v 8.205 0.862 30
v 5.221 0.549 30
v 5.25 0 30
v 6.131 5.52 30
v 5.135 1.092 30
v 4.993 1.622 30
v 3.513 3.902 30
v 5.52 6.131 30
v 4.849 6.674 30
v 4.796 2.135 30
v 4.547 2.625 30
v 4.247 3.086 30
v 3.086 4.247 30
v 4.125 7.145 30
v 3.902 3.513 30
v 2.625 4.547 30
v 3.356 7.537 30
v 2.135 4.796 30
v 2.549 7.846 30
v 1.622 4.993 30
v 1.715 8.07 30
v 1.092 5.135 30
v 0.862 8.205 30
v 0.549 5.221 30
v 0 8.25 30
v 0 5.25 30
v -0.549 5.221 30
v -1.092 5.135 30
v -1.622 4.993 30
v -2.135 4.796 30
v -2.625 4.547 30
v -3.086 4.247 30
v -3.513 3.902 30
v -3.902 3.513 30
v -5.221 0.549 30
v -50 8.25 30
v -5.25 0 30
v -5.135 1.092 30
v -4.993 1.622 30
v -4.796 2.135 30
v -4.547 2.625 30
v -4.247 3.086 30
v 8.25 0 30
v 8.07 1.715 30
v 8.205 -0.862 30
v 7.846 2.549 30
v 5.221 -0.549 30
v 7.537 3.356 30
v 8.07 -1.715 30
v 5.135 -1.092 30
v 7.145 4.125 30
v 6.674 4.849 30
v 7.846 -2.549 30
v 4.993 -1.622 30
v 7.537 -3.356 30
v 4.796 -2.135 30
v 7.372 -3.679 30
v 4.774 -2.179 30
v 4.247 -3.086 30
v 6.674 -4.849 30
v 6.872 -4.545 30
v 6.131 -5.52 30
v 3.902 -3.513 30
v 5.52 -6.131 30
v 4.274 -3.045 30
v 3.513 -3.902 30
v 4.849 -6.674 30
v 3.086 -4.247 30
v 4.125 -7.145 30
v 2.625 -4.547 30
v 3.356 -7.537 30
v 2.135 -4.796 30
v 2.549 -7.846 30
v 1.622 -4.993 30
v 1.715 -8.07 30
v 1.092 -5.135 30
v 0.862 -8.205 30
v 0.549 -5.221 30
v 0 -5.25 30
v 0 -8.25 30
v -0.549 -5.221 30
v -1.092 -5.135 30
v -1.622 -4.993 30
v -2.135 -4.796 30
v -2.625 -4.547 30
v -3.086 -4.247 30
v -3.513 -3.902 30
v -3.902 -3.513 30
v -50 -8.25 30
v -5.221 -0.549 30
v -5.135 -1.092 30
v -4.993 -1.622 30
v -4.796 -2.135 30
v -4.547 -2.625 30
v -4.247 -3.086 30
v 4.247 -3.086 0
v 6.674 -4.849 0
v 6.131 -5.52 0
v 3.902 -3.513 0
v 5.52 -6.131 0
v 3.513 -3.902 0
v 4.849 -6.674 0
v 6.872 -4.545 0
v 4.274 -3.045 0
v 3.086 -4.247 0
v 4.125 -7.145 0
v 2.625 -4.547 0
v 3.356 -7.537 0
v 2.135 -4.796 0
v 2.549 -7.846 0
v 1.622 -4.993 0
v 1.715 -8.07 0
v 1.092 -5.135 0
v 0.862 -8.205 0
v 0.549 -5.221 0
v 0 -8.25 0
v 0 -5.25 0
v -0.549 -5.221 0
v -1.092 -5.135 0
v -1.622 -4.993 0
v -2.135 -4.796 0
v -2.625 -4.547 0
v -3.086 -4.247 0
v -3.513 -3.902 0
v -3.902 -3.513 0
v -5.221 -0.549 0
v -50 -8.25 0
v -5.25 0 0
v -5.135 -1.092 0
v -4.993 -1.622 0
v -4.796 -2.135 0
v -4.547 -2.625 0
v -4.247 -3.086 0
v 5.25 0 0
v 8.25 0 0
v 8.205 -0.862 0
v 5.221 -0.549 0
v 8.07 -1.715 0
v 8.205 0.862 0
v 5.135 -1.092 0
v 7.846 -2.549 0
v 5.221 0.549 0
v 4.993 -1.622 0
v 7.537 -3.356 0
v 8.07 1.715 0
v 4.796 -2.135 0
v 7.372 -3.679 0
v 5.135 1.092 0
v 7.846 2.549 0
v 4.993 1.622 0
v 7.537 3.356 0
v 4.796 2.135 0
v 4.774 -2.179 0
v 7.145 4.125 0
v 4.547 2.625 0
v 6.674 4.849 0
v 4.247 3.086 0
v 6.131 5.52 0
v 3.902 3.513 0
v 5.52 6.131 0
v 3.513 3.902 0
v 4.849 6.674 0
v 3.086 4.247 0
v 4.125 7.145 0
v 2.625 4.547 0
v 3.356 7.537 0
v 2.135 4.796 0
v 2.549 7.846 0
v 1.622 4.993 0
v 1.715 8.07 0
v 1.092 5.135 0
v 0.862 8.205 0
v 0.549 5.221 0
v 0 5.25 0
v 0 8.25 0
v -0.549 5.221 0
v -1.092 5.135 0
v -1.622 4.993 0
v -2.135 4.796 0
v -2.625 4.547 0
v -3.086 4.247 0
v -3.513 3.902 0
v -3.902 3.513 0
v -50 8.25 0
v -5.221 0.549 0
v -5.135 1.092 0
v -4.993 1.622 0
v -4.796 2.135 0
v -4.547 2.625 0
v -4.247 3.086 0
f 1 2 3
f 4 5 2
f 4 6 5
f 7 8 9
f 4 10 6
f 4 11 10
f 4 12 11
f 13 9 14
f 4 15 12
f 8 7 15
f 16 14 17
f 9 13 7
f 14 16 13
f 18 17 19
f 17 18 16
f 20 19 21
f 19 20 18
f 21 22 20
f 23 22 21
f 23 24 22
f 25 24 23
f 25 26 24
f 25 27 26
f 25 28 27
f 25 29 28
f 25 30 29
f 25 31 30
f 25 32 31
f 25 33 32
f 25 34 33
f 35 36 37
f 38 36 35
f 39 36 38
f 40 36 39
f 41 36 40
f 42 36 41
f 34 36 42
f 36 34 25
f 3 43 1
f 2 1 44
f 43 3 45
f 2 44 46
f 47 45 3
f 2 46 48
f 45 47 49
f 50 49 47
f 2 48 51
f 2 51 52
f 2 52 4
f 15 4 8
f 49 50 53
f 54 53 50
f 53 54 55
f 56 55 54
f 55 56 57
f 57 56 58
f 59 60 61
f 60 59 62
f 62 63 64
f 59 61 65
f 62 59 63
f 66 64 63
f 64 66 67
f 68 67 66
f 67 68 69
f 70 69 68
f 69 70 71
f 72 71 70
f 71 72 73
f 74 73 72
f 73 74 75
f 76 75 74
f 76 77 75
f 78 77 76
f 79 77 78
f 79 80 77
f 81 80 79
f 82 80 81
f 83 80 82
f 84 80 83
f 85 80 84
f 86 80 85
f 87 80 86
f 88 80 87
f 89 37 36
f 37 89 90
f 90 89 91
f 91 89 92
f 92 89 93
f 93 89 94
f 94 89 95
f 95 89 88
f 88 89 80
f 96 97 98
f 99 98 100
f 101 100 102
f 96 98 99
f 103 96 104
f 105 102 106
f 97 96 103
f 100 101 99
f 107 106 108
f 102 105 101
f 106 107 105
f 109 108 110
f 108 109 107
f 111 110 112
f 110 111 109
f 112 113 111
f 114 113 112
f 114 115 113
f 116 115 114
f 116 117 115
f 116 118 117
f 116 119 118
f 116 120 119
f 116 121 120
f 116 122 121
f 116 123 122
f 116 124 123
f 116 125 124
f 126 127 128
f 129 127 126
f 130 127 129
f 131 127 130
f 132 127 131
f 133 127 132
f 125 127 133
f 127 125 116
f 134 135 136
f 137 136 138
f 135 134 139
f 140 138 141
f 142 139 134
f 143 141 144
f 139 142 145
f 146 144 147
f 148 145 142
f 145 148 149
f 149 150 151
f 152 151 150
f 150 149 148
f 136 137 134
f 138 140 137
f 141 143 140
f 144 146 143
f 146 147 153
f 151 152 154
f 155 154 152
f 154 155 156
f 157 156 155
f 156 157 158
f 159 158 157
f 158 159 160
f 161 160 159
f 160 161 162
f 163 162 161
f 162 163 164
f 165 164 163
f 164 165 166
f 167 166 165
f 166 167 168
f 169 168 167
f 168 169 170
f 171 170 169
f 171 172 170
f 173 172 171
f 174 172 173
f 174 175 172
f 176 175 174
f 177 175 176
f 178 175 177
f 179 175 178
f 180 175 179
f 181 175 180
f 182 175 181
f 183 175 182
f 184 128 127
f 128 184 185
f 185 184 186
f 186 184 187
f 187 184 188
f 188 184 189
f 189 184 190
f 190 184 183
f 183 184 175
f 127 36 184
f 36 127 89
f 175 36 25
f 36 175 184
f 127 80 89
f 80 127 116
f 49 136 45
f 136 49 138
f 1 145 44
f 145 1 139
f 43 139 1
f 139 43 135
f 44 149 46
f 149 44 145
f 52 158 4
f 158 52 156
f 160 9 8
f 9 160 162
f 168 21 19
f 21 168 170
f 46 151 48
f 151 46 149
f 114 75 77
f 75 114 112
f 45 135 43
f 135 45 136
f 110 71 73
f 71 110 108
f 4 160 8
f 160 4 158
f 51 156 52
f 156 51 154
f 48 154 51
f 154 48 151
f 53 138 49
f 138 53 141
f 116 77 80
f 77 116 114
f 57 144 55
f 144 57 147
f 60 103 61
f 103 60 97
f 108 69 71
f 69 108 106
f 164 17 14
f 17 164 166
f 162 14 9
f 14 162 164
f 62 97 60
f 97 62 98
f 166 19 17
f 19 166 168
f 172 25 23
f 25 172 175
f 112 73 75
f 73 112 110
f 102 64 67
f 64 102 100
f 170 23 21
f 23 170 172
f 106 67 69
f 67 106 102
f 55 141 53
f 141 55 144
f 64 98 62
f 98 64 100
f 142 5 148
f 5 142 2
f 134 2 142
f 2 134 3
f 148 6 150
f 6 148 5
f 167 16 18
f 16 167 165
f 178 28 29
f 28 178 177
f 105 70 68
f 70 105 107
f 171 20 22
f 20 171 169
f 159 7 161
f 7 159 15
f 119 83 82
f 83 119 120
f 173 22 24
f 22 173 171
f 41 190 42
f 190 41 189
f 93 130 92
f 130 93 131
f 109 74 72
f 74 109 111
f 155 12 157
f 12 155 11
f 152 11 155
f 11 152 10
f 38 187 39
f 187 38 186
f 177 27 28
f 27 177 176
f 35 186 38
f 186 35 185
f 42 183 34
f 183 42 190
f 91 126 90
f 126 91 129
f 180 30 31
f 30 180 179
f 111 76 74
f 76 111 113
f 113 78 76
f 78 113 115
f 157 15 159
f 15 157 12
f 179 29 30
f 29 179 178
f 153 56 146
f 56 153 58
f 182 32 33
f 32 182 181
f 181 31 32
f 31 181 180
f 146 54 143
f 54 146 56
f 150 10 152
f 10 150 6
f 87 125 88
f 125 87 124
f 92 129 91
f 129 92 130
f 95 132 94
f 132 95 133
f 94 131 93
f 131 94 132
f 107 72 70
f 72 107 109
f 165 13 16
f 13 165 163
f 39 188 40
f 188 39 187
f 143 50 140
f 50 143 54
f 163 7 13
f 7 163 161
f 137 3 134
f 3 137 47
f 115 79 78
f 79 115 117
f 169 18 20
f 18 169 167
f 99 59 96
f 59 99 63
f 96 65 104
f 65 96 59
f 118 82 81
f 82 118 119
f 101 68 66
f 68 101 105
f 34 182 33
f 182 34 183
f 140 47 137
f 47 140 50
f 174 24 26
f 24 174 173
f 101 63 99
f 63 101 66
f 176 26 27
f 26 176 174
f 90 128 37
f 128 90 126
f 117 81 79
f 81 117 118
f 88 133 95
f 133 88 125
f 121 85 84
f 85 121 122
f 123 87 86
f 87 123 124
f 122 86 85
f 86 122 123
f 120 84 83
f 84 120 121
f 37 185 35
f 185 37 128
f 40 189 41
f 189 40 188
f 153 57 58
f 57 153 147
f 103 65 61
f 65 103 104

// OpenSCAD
// file: funciones.scad
// Nueva impresora by Chema <josema@pentabyte.es>
// Funciones que se usan en otros archivos
// GNU GPL v3
// Mod from
// Josef Průša <josefprusa@me.com>
// Václav 'ax' Hůla <axtheb@gmail.com>
// Vlnofka <>
// http://www.reprap.org/wiki/Prusa_Mendel
// http://github.com/prusajr/PrusaMendel

module screw(h=20, r=2, r_head=3.5, head_drop=0, slant=true, poly=false, $fn=0){
    //makes screw with head
    //for substraction as screw hole
    if (poly) {
        cylinder_poly(h=h, r=r, $fn=$fn);
    } else {
        cylinder(h=h, r=r, $fn=$fn);
    }
    if (slant) {
        translate([0, 0, head_drop-0.01]) cylinder(h=r_head, r2=0, r1=r_head, $fn=$fn);
    }

    if (head_drop > 0) {
        translate([0, 0, -0.01]) cylinder(h=head_drop+0.01, r=r_head, $fn=$fn);
    }
}

module nema17(places=[1,1,1,1], size=15.5, h=10, holes=false, polea=false, shaft=true, shadow=false, $fn=24){
    for (i=[0:3]) {
        if (places[i] == 1) {
            rotate([0, 0, 90*i]) translate([size, size, 0]) {
                if (holes) {
                    #rotate([0, 0, -90*i])  translate([0,0,-h]) screw(r=1.7, slant=false, head_drop=13, $fn=$fn, h=h+12);
                } else {
                    //rotate([0, 0, -90*i]) cylinder(h=h, r=5.5, $fn=$fn);
                }
            }
        }
    }
    if (shadow != false) {
        translate ([0, 0, shadow+21+3]) cube([42,42,42], center = true);
    //flange
        translate ([0, 0, shadow+21+3-21-1]) cylinder(r=11,h=2, center = true, $fn=20);
     }

	if (polea != false) {
	translate ([0,0,-4-4]) cylinder(r=polea/2,h=16,center=true);
	translate ([0,0,-4-12]) cylinder(r=(polea/2)+2,h=1,center=true);
	translate ([0,0,-4-12+10]) cylinder(r=(polea/2)+2,h=1,center=true);
	}
	
	if(shaft){
   //shaft
        translate ([0, 0, shadow+21+3-21-7-5]) cylinder(r=2.5,h=24, center = true);
	}


}

module polea(diam=12,alto=9,imp=false){

  if(imp){
	difference(){
		union(){
		 cylinder(r=diam/2+0.3,h=alto/2,center=true);
		translate ([0,0,-alto/4]) 
		 cylinder(r=(diam/2)+2,h=1,center=true);
//		translate ([0,0,alto/2]) 
//		 cylinder(r=(diam/2)+2,h=1,center=true);
		}
	 translate ([0,0,alto/4-1.5])
	 cylinder(r=623_od/2+0.3,h=alto/2,center=true);
	 #cylinder(r=623_od/2-1,h=100,center=true);
	}
  }else{
	difference(){
		union(){
		 cylinder(r=diam/2,h=alto,center=true);
		translate ([0,0,-alto/2]) 
		 cylinder(r=(diam/2)+2,h=1,center=true);
		translate ([0,0,alto/2]) 
		 cylinder(r=(diam/2)+2,h=1,center=true);
		}
	 cylinder(r=1.6,h=100,center=true);
	}
  }	
}

module nut(d,h,horizontal=true){
    cornerdiameter =  (d / 2) / cos (180 / 6);
    cylinder(h = h, r = cornerdiameter, $fn = 6);
    if(horizontal){
        for(i = [1:6]){
            rotate([0,0,60*i]) translate([-cornerdiameter-0.2,0,0]) rotate([0,0,-45]) cube([2,2,h]);
        }
    }
}

// Based on nophead research
module polyhole(d, h, center=false) {
    n = max(round(2 * d),3);
    rotate([0,0,180])
        cylinder(h = h, r = (d / 2) / cos (180 / n), $fn = n);
}

// make it interchangeable between this and cylinder
module cylinder_poly(r, h, center=false){
    polyhole(d=r*2, h=h, center=center);
}

module fillet(radius, height=100, $fn=0) {
    //this creates acutal fillet
    translate([-radius, -radius, -height/2-0.01])
        difference() {
            cube([radius*2, radius*2, height+0.02]);
            cylinder(r=radius, h=height+0.02, $fn=$fn);
        }
}

module cube_fillet(size, radius=-1, vertical=[3,3,3,3], top=[0,0,0,0], bottom=[0,0,0,0], center=false, $fn=0){
    //
    if (center) {
        cube_fillet_inside(size, radius, vertical, top, bottom, $fn);
    } else {
        translate([size[0]/2, size[1]/2, size[2]/2])
            cube_fillet_inside(size, radius, vertical, top, bottom, $fn);
    }
}

module cube_negative_fillet(size, radius=-1, vertical=[3,3,3,3], top=[0,0,0,0], bottom=[0,0,0,0], $fn=0){

    j=[1,0,1,0];

    for (i=[0:3]) {
        if (radius > -1) {
            rotate([0, 0, 90*i]) translate([size[1-j[i]]/2, size[j[i]]/2, 0]) fillet(radius, size[2], $fn=$fn);
        } else {
            rotate([0, 0, 90*i]) translate([size[1-j[i]]/2, size[j[i]]/2, 0]) fillet(vertical[i], size[2], $fn=$fn);
        }
        rotate([90*i, -90, 0]) translate([size[2]/2, size[j[i]]/2, 0 ]) fillet(top[i], size[1-j[i]], $fn=$fn);
        rotate([90*(4-i), 90, 0]) translate([size[2]/2, size[j[i]]/2, 0]) fillet(bottom[i], size[1-j[i]], $fn=$fn);

    }
}

module cube_fillet_inside(size, radius=-1, vertical=[3,3,3,3], top=[0,0,0,0], bottom=[0,0,0,0], $fn=0){
    //makes CENTERED cube with round corners
    // if you give it radius, it will fillet vertical corners.
    //othervise use vertical, top, bottom arrays
    //when viewed from top, it starts in upper right corner (+x,+y quadrant) , goes counterclockwise
    //top/bottom fillet starts in direction of Y axis and goes CCW too


    if (radius == 0) {
        cube(size, center=true);
    } else {
        difference() {
            cube(size, center=true);
            cube_negative_fillet(size, radius, vertical, top, bottom, $fn);
        }
    }
}

module pushfit_rod(diameter,length){
 cylinder(h = length, r=diameter/2, $fn=30);
 translate(v=[0,-diameter/4,length/2]) cube(size = [diameter,diameter/2,length], center = true);
 translate(v=[0,-diameter/2-2,length/2]) cube(size = [diameter,1,length], center = true);
}
// file: metric.scad
// PRUSA Mendel  
// Default metric sizes
// GNU GPL v2
// Josef Průša
// josefprusa@me.com
// prusadjs.cz
// http://www.reprap.org/wiki/Prusa_Mendel
// http://github.com/prusajr/PrusaMendel

// DONT CHANGE THIS FILE! ALTER VALUES IN CONFIGURATION.SCAD INSTEAD

// RODS

threaded_rod_diameter = 8.2;
threaded_rod_diameter_horizontal = 8.2;
smooth_bar_diameter = 8;
smooth_bar_diameter_horizontal = 8.5;

// Nuts and bolts

m8_diameter = 9;
m8_nut_diameter = 16.4;

m4_diameter = 4.5;
m4_nut_diameter = 9;

m3_diameter = 3.6;
m3_nut_diameter = 6.1;

// Bushing holder

bushing_core_diameter = smooth_bar_diameter;
bushing_material_thickness = 1;

// Motors

motor_shaft = 5.5;
// file: config.scad
// New Printer by Chema
// GNU GPL v3

// Mod basado en
// Josef Průša
// josefprusa@me.com
// prusadjs.cz
// http://www.reprap.org/wiki/Prusa_Mendel
// http://github.com/prusajr/PrusaMendel

// Esquinas:
altura = 40;
fondo = 22;
ancho = 18;
bajos = 6;

grueso=5;

//x_end data y-carriage
x_end_alto=33-10;
x_end_largo=55;
x_end_ancho=35+8;

//altura polea respecto barra superior
//pos barra altura-2 del motor
//pos polea (shaft motor 24mm, polea 18mm alto) 6mm sobre motor (+-2mm)
//espacio para polea (altura) = 12-14mm

//x_rod_distance = (altura-2+grueso-x_end_alto)*2; //29.25*2;
//x_rod_distance = 29.25*2-10;
x_rod_distance = 31+10; //x_end_alto+8;
y_rod_distance = 55;

bearing_diameter = 10.5;
thinwall = 2+1;
bearing_size = bearing_diameter + 2 * thinwall;

623_id=3;
623_od=10;
623_h=4;

//x-carriage
xc_alto=29.25;
xc_largo=90-50;
xc_ancho=altura-2+grueso-x_end_alto;



// PLEASE SELECT ONE OF THE CONFIGURATIONS BELOW
// BY UN-COMMENTING IT

// Uncomment for metric settings
// METRIC METRIC METRIC METRIC METRIC METRIC METRIC METRIC 

include <metric.scad>;

// Uncomment for imperial settings
// IMPERIAL IMPERIAL IMPERIAL IMPERIAL IMPERIAL IMPERIAL IMPERIAL 

//include <sae.scad>;

// LM8UU
linear = false;


// CHANGE ONLY THE STUFF YOU KNOW
// IT WILL REPLACE DEFAULT SETTING

// RODS

// threaded_rod_diameter = 0;
// threaded_rod_diameter_horizontal = 0;
// smooth_bar_díameter = 0;
// smooth_bar_díameter_horizontal = 0;

// Nuts and bolts

// m8_diameter = 0;
// m8_nut_diameter = 0;

// m4_diameter = 0;
// m4_nut_diameter = 0;

// m3_diameter = 0;
// m3_nut_diameter = 0;

// Bushing holder

// bushing_core_diameter = smooth_bar_díameter;
// bushing_material_thickness = 0;


///counted stuff
m3_nut_diameter_bigger = ((m3_nut_diameter  / 2) / cos (180 / 6))*2;

// funciones 
include <funciones.scad>


// Select your belt type ******************************************************

//T2.5
//belt_tooth_distance = 2.5;
//belt_tooth_ratio = 0.5;

//T5 (strongly discouraged)
//belt_tooth_distance = 5;
//belt_tooth_ratio = 0.75;

//HTD3
//belt_tooth_distance = 3;
//belt_tooth_ratio = 0.75;

//MXL
//belt_tooth_distance = 2.032;
//belt_tooth_ratio = 0.64;

//GT2
belt_tooth_distance = 2;
belt_tooth_ratio = 0.5;
belt_grueso = 0.75;
belt_ancho = 6;
// main file
// PRUSA iteration3
// Bearing holders
// GNU GPL v3
// Josef Průša <iam@josefprusa.cz> and contributors
// http://www.reprap.org/wiki/Prusa_Mendel
// http://prusamendel.org
// Mod by Chema (2013) for new printer

include<config.scad>

module horizontal_bearing_base(bearings=1){
 translate(v=[0,0,6]) cube(size = [24,8+bearings*25,12], center = true);	
}
module horizontal_bearing_holes(bearings=1){
 cutter_lenght = 10+bearings*25;
 one_holder_lenght = 8+25;
 holder_lenght = 8+bearings*25;
 
 // Main bearing cut
 difference(){
  translate(v=[0,0,12+1.5]) rotate(a=[90,0,0]) translate(v=[0,0,-cutter_lenght/2]) cylinder(h = cutter_lenght, r=bearing_diameter/2, $fn=50);
  // Bearing retainers
  translate(v=[0,1-holder_lenght/2,3+1.5]) cube(size = [24,6,8], center = true);
  translate(v=[0,-1+holder_lenght/2,3+1.5]) cube(size = [24,6,8], center = true);
 }
 
 // Ziptie cutouts
 ziptie_cut_ofset = 0;
 for ( i = [0 : bearings-1] ){
  // For easier positioning I move them by half of one 
  // bearing holder then add each bearign lenght and then center again
  translate(v=[0,-holder_lenght/2,0]) translate(v=[0,one_holder_lenght/2+i*25,0]) difference(){
   union(){
    translate(v=[0,2-6-2,12]) rotate(a=[90,0,0]) translate(v=[0,0,0]) cylinder(h = 4, r=12.5, $fn=50);
    translate(v=[0,2+6+2,12]) rotate(a=[90,0,0]) translate(v=[0,0,0]) cylinder(h = 4, r=12.5, $fn=50);
   }
   translate(v=[0,10,12]) rotate(a=[90,0,0]) translate(v=[0,0,0]) cylinder(h = 24, r=10, $fn=50);
  }
 }
 
}

module horizontal_bearing_test(){
 difference(){
  horizontal_bearing_base(1);
  horizontal_bearing_holes(1);
 }
 translate(v=[30,0,0]) difference(){
  horizontal_bearing_base(2);
  horizontal_bearing_holes(2);
 }
 translate(v=[60,0,0]) difference(){
  horizontal_bearing_base(3);
  horizontal_bearing_holes(3);
 }
}





module vertical_bearing_base(largo=60,ancho=bearing_size,$fn=60){
 translate(v=[-(ancho)/2,0,largo/2]) cube(size = [ancho,bearing_size,largo], center = true);
 cylinder(h = largo, r=bearing_size/2, $fn = $fn);
}

module vertical_bearing_holes(largo=60,corte=false,$fn=60){
  translate(v=[0,0,-1]) cylinder(h = largo+2, r=bearing_diameter/2, $fn = $fn);
	if(corte){
    		rotate(a=[0,0,-largo]) translate(v=[bearing_diameter/2+thinwall,0,largo/2]) cube(size = [bearing_diameter+thinwall,1,largo+2], center = true);
	}
}

module soporte_bearing(largo=25,ancho=bearing_size,corte=false,$fn=60){
	difference(){
	vertical_bearing_base(largo=largo,ancho=ancho,$fn=$fn);
	vertical_bearing_holes(largo=largo,corte=corte);
	}
}
soporte_bearing(largo=30,ancho=50,corte=true);
%cube ([10,12,25]);
//translate([-50,0,0]) cube([50,10,30]);
//translate([-50+bearing_size/2,0,0]) cube([50,10,10]);
//horizontal_bearing_test();
